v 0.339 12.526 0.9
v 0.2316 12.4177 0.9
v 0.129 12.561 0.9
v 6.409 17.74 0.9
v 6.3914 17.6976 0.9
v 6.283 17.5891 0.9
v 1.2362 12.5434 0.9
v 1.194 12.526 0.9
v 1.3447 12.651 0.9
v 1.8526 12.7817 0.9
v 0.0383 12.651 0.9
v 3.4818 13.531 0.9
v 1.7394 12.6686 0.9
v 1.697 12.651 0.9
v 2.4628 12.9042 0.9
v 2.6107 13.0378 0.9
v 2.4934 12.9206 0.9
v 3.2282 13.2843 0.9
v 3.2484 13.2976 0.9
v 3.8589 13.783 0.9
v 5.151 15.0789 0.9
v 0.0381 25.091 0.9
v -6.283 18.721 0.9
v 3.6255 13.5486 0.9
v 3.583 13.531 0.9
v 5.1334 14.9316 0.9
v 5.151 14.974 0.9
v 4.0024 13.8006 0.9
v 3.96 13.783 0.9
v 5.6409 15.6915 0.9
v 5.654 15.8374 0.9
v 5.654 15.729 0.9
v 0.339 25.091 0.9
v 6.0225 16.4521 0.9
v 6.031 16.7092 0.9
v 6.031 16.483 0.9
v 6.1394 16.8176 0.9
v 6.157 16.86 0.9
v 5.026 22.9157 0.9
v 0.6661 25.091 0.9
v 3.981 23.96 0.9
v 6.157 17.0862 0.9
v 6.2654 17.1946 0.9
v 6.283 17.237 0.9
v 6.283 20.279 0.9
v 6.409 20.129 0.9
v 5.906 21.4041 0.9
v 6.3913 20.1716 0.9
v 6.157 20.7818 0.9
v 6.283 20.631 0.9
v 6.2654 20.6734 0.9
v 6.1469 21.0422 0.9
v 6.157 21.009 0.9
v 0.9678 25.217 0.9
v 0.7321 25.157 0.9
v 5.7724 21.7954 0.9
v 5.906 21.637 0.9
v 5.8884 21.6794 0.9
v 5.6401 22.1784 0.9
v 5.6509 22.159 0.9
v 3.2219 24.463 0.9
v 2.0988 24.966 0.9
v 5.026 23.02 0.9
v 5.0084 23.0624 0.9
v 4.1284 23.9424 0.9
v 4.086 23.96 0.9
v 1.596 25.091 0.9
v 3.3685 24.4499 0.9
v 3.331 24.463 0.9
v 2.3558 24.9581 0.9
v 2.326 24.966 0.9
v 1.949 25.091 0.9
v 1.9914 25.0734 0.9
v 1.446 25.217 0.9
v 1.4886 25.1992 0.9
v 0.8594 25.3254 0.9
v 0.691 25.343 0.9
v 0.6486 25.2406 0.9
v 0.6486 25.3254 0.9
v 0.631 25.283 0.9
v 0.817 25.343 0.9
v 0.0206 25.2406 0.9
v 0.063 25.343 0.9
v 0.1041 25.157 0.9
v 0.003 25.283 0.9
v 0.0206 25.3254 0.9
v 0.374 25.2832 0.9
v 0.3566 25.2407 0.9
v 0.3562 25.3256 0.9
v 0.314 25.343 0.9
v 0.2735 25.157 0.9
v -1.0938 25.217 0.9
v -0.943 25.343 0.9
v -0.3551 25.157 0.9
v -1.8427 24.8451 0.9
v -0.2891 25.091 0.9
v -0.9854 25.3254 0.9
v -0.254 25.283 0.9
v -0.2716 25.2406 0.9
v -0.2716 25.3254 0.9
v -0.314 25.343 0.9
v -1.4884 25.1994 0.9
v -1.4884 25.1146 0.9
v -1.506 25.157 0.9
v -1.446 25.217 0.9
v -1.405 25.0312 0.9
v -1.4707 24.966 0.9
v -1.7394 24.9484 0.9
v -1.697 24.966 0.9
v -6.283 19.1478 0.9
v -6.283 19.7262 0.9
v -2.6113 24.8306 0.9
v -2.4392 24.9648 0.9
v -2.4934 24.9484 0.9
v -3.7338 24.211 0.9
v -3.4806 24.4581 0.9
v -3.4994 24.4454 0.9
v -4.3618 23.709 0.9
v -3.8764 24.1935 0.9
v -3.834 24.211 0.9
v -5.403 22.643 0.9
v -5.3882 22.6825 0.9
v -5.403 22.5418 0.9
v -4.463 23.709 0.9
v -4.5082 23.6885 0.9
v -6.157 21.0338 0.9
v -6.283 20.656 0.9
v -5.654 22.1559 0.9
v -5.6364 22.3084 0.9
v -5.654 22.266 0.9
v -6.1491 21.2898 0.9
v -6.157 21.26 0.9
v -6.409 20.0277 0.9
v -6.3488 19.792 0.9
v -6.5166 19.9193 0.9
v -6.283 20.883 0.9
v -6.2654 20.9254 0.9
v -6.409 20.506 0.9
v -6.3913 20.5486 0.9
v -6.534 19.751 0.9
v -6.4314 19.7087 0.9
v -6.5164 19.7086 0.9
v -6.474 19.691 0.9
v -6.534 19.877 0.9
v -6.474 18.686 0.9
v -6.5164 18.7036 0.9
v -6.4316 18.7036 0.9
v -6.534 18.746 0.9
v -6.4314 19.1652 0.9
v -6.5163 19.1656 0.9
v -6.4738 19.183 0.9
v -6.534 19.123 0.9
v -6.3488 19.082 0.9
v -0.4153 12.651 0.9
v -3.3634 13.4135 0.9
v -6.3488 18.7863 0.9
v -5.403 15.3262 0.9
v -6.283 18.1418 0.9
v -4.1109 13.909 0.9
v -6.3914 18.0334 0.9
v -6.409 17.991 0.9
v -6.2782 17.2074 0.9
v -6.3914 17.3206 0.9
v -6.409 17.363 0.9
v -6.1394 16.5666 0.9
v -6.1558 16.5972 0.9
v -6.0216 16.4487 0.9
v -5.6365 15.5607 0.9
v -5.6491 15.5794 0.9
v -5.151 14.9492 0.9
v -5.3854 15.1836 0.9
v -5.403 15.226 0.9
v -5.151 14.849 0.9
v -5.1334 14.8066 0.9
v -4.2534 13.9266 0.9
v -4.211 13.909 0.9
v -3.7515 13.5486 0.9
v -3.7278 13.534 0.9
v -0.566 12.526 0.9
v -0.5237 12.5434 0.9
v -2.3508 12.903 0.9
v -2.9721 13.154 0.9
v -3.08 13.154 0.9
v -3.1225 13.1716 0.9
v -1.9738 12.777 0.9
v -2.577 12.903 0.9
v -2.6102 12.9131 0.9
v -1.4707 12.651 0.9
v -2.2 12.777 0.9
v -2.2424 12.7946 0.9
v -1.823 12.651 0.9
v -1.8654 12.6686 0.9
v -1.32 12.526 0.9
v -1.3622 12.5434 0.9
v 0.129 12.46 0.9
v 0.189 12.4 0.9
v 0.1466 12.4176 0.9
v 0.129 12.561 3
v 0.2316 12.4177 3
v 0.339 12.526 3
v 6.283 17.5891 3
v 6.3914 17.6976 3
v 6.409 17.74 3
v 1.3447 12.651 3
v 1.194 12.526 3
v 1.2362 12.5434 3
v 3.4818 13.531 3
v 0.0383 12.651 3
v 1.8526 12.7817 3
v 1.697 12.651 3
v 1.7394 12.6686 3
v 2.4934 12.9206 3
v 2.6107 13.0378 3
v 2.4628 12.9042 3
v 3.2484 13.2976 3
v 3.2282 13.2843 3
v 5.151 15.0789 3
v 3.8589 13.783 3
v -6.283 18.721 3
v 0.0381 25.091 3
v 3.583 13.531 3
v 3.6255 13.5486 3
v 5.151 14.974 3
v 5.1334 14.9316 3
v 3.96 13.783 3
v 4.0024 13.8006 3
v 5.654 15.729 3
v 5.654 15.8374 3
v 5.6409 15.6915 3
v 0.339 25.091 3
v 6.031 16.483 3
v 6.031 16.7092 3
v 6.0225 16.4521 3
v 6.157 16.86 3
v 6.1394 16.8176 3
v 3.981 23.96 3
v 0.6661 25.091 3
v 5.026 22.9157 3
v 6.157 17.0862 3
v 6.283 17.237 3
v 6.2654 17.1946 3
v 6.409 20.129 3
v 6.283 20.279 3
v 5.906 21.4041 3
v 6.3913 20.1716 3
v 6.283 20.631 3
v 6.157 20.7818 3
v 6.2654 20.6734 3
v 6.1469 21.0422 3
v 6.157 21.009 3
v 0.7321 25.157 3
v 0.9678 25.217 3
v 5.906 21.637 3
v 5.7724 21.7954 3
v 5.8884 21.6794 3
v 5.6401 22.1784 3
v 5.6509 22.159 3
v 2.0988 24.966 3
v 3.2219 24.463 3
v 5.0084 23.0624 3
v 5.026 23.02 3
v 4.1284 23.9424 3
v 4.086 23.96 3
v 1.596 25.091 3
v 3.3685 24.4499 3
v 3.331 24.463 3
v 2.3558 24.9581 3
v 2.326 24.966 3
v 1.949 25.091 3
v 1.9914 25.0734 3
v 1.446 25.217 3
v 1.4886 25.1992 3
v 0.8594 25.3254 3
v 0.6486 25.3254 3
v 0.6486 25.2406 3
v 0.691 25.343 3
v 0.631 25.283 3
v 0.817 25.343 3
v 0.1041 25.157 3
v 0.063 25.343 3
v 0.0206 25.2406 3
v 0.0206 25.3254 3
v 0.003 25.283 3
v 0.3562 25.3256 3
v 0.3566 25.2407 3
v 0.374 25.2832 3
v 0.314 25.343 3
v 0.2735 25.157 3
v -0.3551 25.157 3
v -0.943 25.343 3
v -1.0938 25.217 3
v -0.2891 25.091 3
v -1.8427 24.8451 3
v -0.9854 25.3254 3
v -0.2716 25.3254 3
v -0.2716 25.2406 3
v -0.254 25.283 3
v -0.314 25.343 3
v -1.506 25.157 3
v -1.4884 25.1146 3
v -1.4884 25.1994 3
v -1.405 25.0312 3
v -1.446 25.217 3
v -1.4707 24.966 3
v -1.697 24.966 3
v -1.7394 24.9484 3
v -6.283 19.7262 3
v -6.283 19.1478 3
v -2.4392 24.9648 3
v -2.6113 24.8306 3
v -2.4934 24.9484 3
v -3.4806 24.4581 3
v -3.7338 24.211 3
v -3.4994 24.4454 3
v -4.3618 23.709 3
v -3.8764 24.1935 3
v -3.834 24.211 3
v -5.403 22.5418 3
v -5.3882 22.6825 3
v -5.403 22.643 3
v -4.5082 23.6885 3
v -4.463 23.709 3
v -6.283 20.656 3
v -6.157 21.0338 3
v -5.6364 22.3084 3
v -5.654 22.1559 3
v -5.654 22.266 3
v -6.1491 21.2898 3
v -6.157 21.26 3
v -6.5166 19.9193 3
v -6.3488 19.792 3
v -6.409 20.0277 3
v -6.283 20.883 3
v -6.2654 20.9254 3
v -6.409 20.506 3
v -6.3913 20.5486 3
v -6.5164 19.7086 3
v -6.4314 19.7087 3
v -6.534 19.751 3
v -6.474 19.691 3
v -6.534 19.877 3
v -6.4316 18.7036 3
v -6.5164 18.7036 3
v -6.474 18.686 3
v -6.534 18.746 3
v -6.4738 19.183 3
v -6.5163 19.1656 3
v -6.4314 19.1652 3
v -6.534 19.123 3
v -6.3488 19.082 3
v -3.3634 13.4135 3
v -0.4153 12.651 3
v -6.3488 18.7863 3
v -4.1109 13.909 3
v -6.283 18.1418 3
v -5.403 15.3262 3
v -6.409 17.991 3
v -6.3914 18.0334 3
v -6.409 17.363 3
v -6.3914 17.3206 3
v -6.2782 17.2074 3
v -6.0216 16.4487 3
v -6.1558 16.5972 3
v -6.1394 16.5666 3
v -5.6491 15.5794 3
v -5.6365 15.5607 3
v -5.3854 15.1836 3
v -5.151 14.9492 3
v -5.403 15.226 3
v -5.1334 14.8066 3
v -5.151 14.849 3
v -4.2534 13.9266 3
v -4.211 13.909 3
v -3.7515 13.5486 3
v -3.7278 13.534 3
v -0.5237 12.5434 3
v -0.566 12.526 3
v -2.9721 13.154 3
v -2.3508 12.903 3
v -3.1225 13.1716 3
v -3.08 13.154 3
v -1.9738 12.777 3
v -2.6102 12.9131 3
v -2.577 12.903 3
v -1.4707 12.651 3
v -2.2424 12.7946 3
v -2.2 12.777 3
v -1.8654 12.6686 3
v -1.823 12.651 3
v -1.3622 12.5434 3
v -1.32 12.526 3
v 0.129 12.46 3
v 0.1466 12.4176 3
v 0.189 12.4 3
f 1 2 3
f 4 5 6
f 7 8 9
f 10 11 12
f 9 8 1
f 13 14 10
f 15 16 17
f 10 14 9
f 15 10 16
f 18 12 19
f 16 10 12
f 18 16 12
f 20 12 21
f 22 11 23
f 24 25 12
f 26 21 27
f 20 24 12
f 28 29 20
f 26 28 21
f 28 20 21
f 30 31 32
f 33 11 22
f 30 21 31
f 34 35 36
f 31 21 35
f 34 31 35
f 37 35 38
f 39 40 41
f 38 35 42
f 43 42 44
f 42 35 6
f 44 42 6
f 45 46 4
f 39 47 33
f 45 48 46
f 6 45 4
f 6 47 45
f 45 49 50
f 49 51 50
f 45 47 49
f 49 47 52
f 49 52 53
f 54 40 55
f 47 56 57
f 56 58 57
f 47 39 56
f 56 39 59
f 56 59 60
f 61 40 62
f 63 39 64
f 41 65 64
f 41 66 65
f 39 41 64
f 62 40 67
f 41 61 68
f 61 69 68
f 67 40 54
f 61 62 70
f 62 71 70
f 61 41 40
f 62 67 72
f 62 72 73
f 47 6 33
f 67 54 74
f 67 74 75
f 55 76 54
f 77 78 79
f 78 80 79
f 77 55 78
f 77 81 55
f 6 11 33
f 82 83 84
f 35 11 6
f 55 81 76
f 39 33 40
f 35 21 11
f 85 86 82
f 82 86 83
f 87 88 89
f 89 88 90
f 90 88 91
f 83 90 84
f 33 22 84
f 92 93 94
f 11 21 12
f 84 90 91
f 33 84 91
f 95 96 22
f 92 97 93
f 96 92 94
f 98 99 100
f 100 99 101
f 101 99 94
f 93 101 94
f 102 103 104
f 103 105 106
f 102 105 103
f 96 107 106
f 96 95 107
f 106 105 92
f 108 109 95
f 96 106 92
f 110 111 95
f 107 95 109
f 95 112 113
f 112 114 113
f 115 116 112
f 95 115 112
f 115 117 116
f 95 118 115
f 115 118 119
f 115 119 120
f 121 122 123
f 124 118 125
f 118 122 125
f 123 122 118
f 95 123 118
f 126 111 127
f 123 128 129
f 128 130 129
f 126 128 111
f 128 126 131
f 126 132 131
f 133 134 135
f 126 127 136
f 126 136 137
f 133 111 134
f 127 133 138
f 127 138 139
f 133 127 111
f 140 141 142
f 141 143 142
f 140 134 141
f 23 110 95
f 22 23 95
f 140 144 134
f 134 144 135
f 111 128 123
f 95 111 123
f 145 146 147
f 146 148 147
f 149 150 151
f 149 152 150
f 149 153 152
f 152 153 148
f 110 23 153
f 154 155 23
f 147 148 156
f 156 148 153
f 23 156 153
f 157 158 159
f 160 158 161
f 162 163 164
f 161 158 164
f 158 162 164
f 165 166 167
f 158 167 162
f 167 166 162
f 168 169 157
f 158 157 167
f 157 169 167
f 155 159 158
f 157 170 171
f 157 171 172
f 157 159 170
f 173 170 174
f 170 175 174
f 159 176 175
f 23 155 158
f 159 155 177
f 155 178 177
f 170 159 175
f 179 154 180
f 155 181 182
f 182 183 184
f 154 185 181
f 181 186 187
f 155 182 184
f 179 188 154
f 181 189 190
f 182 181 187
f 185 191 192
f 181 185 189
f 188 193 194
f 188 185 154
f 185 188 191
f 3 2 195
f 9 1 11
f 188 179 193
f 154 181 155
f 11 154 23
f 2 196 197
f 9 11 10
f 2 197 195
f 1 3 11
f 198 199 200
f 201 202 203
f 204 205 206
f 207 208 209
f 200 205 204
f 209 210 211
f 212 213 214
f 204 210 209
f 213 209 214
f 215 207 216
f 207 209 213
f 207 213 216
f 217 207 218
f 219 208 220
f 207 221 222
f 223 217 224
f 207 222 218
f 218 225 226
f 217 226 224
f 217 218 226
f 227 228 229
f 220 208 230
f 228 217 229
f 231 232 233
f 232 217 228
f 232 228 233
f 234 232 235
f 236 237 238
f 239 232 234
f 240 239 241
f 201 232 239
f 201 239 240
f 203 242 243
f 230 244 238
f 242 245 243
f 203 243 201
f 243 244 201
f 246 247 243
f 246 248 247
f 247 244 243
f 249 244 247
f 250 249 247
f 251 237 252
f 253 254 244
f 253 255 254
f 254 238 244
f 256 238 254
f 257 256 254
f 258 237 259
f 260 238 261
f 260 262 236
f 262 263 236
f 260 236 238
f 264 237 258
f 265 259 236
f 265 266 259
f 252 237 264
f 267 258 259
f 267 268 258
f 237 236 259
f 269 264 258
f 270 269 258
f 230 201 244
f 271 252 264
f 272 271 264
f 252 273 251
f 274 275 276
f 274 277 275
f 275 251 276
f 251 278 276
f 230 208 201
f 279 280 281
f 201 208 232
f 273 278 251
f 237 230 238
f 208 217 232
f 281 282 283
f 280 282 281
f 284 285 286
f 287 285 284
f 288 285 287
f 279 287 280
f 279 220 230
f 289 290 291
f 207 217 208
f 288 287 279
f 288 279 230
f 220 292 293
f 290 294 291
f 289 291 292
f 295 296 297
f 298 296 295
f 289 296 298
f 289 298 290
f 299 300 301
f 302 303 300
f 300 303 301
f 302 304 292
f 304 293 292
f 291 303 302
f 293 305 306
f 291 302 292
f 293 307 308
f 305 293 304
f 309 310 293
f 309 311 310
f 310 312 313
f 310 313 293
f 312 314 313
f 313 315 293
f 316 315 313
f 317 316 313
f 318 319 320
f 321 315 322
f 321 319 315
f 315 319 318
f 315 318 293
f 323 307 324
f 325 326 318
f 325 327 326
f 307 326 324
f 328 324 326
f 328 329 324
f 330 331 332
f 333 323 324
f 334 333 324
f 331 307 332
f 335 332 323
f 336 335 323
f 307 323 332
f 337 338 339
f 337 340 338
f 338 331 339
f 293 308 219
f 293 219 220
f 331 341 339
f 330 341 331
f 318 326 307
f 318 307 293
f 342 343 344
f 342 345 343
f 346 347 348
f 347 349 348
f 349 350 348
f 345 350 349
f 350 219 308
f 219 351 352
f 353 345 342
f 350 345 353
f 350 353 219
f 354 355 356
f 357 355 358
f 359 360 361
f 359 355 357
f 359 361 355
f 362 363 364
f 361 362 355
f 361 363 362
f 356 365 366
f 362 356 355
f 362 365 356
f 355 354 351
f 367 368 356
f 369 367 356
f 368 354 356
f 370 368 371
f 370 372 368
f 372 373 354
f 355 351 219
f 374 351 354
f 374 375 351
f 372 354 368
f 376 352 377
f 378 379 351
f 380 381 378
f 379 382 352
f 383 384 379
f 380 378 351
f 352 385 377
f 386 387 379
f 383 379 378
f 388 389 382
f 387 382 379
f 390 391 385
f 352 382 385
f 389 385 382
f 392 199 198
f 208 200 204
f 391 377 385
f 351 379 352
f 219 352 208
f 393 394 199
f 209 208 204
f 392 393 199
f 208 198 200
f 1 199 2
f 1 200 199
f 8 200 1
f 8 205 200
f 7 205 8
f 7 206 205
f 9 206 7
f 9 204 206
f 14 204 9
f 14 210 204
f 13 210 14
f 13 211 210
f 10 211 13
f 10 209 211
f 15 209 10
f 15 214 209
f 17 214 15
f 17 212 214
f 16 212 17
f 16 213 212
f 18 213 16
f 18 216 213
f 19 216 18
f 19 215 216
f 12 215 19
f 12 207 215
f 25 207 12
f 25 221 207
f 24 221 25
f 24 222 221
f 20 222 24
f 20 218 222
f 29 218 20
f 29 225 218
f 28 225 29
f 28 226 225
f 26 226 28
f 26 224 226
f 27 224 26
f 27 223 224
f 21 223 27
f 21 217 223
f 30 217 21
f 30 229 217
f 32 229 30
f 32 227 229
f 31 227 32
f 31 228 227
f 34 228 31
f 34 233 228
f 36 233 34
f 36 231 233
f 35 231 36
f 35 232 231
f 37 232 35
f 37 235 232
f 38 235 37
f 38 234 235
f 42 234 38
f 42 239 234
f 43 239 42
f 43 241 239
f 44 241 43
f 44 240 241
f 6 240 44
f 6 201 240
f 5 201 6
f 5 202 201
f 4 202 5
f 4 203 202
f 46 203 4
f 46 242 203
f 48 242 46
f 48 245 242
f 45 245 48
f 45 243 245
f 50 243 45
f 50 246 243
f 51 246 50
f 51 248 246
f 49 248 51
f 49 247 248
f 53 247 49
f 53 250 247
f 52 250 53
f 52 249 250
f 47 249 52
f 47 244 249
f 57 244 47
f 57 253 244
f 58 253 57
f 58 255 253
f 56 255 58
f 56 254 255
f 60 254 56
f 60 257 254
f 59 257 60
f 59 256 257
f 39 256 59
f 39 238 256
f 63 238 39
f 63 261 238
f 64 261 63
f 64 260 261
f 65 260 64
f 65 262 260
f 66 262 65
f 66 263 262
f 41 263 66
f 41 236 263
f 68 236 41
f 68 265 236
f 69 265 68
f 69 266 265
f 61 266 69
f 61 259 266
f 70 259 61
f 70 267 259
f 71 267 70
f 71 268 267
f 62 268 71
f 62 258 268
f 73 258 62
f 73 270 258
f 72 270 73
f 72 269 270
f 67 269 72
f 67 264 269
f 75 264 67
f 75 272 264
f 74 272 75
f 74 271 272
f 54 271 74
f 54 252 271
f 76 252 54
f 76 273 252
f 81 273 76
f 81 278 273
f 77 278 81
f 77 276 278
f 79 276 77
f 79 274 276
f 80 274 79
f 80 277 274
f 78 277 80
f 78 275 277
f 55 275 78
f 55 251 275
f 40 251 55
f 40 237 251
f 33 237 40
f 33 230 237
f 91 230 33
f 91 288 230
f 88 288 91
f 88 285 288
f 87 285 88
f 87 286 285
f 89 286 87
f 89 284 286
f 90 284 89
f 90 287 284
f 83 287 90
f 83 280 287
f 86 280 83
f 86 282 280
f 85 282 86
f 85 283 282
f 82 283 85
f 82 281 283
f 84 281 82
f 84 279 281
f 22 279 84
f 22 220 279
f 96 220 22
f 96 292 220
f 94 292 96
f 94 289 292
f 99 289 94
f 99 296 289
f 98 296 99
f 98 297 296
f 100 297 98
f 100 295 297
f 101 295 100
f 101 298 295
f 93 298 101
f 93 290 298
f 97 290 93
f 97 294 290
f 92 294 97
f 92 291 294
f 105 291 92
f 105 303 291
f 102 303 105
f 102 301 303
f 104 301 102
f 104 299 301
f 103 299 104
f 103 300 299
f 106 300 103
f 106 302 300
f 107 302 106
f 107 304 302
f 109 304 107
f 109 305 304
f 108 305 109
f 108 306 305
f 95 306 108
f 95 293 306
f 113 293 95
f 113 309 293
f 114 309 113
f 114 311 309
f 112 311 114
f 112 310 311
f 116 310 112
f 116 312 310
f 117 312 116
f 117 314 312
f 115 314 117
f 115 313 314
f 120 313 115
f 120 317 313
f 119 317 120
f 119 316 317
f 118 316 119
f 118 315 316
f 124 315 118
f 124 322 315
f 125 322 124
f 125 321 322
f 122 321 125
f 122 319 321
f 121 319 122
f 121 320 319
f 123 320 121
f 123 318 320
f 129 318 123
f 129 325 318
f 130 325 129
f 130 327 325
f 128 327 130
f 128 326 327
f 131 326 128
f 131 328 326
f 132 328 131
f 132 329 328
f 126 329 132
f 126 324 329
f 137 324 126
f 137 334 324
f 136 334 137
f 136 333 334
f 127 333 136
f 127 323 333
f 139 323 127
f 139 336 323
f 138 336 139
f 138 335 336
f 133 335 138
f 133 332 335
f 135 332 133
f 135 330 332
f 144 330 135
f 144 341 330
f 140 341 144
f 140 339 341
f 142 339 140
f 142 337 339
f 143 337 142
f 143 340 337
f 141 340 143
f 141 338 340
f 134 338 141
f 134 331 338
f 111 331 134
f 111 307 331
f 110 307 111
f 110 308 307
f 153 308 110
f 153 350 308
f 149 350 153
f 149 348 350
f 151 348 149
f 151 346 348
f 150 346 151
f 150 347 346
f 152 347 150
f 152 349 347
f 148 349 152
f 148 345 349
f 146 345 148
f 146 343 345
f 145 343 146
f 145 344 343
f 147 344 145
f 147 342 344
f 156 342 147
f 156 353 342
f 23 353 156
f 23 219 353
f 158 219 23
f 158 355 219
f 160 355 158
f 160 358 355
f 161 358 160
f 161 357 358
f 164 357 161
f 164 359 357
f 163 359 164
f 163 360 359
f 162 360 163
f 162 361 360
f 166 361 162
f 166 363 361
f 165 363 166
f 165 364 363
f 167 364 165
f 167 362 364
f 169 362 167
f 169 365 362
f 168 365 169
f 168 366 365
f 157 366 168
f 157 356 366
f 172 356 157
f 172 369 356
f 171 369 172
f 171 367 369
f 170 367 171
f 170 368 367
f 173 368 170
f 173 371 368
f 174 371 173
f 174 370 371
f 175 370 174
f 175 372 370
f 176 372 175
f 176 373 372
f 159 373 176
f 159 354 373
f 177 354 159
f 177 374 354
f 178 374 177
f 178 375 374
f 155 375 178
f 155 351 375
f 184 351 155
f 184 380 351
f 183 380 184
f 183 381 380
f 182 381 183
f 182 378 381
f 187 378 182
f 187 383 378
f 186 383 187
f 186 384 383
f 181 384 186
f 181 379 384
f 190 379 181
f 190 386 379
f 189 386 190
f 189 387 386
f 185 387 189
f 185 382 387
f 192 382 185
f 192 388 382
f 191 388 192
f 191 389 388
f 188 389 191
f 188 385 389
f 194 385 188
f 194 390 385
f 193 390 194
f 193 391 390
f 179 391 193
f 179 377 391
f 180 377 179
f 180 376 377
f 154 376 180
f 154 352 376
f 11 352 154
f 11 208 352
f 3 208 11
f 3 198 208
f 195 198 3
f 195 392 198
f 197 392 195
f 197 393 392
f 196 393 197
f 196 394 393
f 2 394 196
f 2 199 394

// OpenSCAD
$fn = 24;
translate([0, -2.500, 0.900])
  linear_extrude(height=2.100) {
offset(r=0.06, $fn=8) {
    polygon(points=[[-0.943,27.783],[-1.069,27.657],[-1.571,27.657],[-1.446,27.657],[-1.320,27.531],[-1.446,27.406],[-1.697,27.406],[-1.823,27.531],[-1.949,27.531],[-1.823,27.531],[-1.697,27.406],[-1.823,27.280],[-2.451,27.406],[-2.577,27.280],[-3.457,26.903],[-3.709,26.651],[-3.834,26.651],[-4.337,26.149],[-4.463,26.149],[-5.343,25.143],[-5.343,25.017],[-5.594,24.766],[-5.594,24.640],[-6.097,23.760],[-6.097,23.509],[-6.223,23.383],[-6.223,23.131],[-6.349,23.006],[-6.349,22.503],[-6.474,22.377],[-6.474,20.617],[-6.349,20.491],[-6.349,19.863],[-6.223,19.737],[-6.097,19.109],[-5.971,18.983],[-5.594,18.103],[-5.343,17.851],[-5.343,17.726],[-5.091,17.474],[-5.091,17.349],[-4.211,16.469],[-4.086,16.469],[-3.709,16.091],[-3.331,15.966],[-3.080,15.714],[-2.954,15.714],[-2.577,15.463],[-2.326,15.463],[-2.200,15.337],[-1.949,15.337],[-1.823,15.211],[-1.446,15.211],[-1.320,15.086],[-0.566,15.086],[-0.440,15.211],[0.063,15.211],[0.189,15.086],[0.189,14.960],[0.314,15.086],[1.194,15.086],[1.320,15.211],[1.697,15.211],[1.823,15.337],[2.451,15.463],[2.577,15.589],[3.206,15.840],[3.457,16.091],[3.583,16.091],[3.834,16.343],[3.960,16.343],[5.091,17.474],[5.091,17.600],[5.594,18.229],[5.594,18.354],[5.971,18.983],[5.971,19.234],[6.097,19.360],[6.097,19.611],[6.223,19.737],[6.223,20.114],[6.349,20.240],[6.349,22.629],[6.223,22.754],[6.223,23.131],[6.097,23.257],[6.097,23.509],[5.846,23.886],[5.846,24.137],[5.720,24.263],[5.594,24.640],[4.966,25.394],[4.966,25.520],[4.086,26.400],[3.960,26.400],[3.331,26.903],[3.206,26.903],[2.326,27.406],[2.074,27.406],[1.949,27.531],[1.571,27.531],[1.446,27.657],[0.943,27.657],[0.817,27.783],[-6.349,21.371],[-6.223,21.246],[-6.223,20.617],[-6.349,20.491],[-6.474,20.617],[-6.474,21.246],[-6.349,22.377],[-6.223,22.251],[-6.223,21.623],[-6.349,21.497],[-6.474,21.623],[-6.474,22.251],[0.189,27.657],[0.314,27.783],[0.691,27.783],[0.817,27.657],[0.691,27.531],[0.314,27.531],[-0.440,27.657],[-0.314,27.783],[0.063,27.783],[0.189,27.657],[0.063,27.531],[-0.314,27.531]], paths=[[0,1,2,3,4,5,6,7,8,9,10,11,12,13,14,15,16,17,18,19,20,21,22,23,24,25,26,27,28,29,30,31,32,33,34,35,36,37,38,39,40,41,42,43,44,45,46,47,48,49,50,51,52,53,54,55,56,57,58,59,60,61,62,63,64,65,66,67,68,69,70,71,72,73,74,75,76,77,78,79,80,81,82,83,84,85,86,87,88,89,90,91,92,93,94,95,96,97,98,99,100,101,102,103],[104,105,106,107,108,109],[110,111,112,113,114,115],[116,117,118,119,120,121],[122,123,124,125,126,127]]);
}
}
